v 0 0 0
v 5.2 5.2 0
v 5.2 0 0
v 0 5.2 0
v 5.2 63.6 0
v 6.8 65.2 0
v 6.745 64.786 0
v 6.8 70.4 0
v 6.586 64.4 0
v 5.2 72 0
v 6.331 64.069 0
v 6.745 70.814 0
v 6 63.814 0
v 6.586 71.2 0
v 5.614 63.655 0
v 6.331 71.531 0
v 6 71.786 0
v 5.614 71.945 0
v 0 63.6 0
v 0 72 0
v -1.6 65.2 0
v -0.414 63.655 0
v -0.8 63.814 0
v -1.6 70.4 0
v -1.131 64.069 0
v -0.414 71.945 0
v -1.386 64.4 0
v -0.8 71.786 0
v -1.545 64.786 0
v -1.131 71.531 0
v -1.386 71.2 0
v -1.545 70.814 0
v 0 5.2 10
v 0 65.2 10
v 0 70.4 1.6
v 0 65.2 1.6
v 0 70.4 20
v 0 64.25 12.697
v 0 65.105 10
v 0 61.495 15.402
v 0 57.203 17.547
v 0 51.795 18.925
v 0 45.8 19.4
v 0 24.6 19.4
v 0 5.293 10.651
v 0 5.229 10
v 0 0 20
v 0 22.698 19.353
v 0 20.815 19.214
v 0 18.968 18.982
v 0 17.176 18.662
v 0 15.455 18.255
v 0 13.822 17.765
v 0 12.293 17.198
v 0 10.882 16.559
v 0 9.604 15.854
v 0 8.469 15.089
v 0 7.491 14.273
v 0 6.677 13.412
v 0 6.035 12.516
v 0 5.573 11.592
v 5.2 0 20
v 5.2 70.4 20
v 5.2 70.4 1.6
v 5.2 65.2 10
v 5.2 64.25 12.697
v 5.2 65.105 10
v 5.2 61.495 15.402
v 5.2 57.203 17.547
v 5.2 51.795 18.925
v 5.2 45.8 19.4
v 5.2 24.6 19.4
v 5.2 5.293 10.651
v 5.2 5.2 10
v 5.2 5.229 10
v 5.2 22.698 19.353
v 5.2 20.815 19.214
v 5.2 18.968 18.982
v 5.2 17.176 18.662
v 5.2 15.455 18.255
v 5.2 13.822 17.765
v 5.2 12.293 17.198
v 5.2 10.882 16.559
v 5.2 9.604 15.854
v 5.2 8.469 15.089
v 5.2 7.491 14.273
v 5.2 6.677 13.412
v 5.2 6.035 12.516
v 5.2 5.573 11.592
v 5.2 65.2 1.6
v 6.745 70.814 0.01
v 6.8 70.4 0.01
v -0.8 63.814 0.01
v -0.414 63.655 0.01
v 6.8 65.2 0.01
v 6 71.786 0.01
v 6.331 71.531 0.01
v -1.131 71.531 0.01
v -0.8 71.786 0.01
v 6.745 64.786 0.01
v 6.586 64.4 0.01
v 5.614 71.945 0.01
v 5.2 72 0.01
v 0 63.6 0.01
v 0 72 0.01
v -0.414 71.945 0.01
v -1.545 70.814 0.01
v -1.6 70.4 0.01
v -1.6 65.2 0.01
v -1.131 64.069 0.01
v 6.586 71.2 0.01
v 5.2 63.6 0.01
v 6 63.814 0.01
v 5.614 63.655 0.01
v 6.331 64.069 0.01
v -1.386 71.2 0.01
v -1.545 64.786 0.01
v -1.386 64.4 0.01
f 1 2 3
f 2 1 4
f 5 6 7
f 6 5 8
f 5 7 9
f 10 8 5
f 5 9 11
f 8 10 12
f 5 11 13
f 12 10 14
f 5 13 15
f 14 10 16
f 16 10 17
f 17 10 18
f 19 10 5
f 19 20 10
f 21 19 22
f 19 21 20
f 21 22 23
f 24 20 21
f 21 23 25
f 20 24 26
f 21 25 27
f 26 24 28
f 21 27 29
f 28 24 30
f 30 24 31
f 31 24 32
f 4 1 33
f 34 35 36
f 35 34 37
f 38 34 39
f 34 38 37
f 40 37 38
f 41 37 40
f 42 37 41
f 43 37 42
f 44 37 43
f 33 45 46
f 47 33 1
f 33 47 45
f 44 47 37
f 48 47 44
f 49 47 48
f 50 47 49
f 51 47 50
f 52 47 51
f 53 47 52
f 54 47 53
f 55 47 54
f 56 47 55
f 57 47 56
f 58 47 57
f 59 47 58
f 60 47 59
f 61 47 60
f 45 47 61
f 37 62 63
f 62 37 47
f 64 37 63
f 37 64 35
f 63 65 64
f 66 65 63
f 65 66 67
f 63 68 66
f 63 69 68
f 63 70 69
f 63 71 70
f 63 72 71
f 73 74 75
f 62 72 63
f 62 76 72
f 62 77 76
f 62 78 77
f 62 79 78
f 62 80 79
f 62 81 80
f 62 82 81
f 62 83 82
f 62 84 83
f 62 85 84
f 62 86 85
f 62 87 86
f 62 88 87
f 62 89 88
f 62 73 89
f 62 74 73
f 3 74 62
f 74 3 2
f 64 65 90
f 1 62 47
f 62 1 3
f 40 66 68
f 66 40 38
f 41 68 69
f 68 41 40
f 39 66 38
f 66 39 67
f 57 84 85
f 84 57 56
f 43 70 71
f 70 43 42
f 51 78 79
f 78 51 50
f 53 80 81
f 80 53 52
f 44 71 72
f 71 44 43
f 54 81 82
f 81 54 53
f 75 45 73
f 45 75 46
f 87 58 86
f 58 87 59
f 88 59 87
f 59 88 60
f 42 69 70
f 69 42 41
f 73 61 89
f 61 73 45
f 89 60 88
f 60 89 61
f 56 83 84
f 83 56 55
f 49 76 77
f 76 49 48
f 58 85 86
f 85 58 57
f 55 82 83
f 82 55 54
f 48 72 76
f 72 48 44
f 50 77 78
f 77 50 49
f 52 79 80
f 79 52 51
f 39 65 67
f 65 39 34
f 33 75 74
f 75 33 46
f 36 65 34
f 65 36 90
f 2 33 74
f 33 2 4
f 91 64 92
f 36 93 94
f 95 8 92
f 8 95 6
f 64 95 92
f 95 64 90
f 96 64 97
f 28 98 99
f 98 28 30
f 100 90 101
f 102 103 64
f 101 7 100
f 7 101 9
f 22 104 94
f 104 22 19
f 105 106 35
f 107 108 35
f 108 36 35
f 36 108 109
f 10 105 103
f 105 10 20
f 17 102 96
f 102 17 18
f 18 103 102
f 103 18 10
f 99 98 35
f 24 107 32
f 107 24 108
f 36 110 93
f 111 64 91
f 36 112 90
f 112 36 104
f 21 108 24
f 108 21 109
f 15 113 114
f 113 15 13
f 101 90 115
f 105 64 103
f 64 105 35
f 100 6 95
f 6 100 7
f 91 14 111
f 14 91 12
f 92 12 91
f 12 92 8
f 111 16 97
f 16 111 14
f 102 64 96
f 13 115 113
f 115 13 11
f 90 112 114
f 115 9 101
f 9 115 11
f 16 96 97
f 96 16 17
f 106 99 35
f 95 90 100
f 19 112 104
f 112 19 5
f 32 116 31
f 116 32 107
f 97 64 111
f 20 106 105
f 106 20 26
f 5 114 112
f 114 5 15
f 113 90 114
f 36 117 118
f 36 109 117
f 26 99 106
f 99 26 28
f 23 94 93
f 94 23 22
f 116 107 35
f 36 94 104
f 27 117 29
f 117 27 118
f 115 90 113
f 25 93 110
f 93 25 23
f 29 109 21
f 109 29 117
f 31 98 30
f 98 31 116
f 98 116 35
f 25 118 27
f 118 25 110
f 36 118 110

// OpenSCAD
// CS F453 S26 Showcase Print
// 2026-01-13
//
// Print features:
// * Long, breakable rod (to be broken) (with and without fillet)
// * Long, not-so-breakable rod (combined with peeling example)
// * Progressively steeper overhang (combined with bridge and breakable rod)
// * Long bridge (combined with steep overhangs, breakable rod, fillet)
// * Small portion with poor adhesion (with and without brim)
// * Small portion prone to peeling/lifting (with and without brim)
// * Holes parallel and perpendicular to build plate (combined with d profile)
// * Thing that holds everything together is sparse, not sheet
// * Progressively larger text to showcase resolution (horiz and vert)

layer_thick = 0.2;
nozzle_dia = 0.4;

rod_size = 5.2;
fillet_rad = 1.6;
bridge_len = 60.0;
bridge_h = 20.0;
bridge_thick = 3*layer_thick;

// Modules can act on geometry!
module moveToBridgeEnd() {
    translate([0,bridge_len+rod_size])
    children(); // Says "any geometry following a call to this module"
}


module filletedRodBase() {
    translate([0,bridge_len+rod_size])
    offset(fillet_rad, $fn=24)
    square(rod_size);
}

module rodsAndBridgeBase() {
    square(rod_size);
    filletedRodBase();
}
//rodsAndBridgeBase();

module trapezoidTranslate() {
    translate([2*rod_size+4*nozzle_dia,trapezoid_len/2,0])
    children();
}

trapezoid_base = rod_size;
trapezoid_top = 1.5*nozzle_dia;
trapezoid_len = 40.0;
module flippedTrapezoidBase() {
    trapezoidTranslate()
    square([trapezoid_top, trapezoid_len], center=true);
}

module flippedTrapezoid() {
    hull() {
        linear_extrude(0.01)
        flippedTrapezoidBase();
        translate([0,0,trapezoid_base-0.01])
        trapezoidTranslate()
        linear_extrude(0.01)
        square([trapezoid_base, trapezoid_len], center=true);
    }
}
//flippedTrapezoid();

module brimmedTrapezoidTranslate() {
    translate([-rod_size-4*nozzle_dia,trapezoid_len/2,0])
    children();
}

module brimmedFlippedTrapezoidBase() {
    brimmedTrapezoidTranslate()
    square([trapezoid_top, trapezoid_len], center=true);
}

module brimmedFlippedTrapezoid() {
    hull() {
        linear_extrude(0.01)
        brimmedFlippedTrapezoidBase();
        translate([0,0,trapezoid_base-0.01])
        brimmedTrapezoidTranslate()
        linear_extrude(0.01)
        square([trapezoid_base, trapezoid_len], center=true);
    }
    
    brimmedTrapezoidTranslate()
    linear_extrude(layer_thick)
    offset(2.0, $fn=32) // Add a custom 2mm brim
    square([trapezoid_top, trapezoid_len], center=true);
}

//brimmedFlippedTrapezoid();

module rodsAndBridge3D() {
    // The diameter of the bridge's overhang
    overhang_dia = 2*(bridge_h-bridge_thick);
    
    difference() {
        // Bridge starts as a long rectangular prism
        linear_extrude(bridge_h)
        square([rod_size, bridge_len+2*rod_size]);
        
        // Cut out the arch (two hulled sideways cylinders)
        hull() {
            translate([0,rod_size+overhang_dia/2, overhang_dia/4])
            scale([1,1,0.5])
            rotate([0,90,0])
            cylinder(d=overhang_dia, h=rod_size, $fn=64);
            translate([0,rod_size+overhang_dia/2+bridge_len-overhang_dia,overhang_dia/4])
            scale([1,1,0.5])
            rotate([0,90,0])
            cylinder(d=overhang_dia, h=rod_size, $fn=20);
        }
        translate([0,rod_size,0])
        cube([rod_size, bridge_len, bridge_h/2]);
    }
    
    // Bridge fillet (more like a chamfer; not pretty in OpenSCAD!)
    hull() {
        moveToBridgeEnd()
        translate([0,0,fillet_rad-0.01])
        linear_extrude(0.01)
        square(rod_size);
        linear_extrude(0.01)
        filletedRodBase();
    }
}
rodsAndBridge3D();
